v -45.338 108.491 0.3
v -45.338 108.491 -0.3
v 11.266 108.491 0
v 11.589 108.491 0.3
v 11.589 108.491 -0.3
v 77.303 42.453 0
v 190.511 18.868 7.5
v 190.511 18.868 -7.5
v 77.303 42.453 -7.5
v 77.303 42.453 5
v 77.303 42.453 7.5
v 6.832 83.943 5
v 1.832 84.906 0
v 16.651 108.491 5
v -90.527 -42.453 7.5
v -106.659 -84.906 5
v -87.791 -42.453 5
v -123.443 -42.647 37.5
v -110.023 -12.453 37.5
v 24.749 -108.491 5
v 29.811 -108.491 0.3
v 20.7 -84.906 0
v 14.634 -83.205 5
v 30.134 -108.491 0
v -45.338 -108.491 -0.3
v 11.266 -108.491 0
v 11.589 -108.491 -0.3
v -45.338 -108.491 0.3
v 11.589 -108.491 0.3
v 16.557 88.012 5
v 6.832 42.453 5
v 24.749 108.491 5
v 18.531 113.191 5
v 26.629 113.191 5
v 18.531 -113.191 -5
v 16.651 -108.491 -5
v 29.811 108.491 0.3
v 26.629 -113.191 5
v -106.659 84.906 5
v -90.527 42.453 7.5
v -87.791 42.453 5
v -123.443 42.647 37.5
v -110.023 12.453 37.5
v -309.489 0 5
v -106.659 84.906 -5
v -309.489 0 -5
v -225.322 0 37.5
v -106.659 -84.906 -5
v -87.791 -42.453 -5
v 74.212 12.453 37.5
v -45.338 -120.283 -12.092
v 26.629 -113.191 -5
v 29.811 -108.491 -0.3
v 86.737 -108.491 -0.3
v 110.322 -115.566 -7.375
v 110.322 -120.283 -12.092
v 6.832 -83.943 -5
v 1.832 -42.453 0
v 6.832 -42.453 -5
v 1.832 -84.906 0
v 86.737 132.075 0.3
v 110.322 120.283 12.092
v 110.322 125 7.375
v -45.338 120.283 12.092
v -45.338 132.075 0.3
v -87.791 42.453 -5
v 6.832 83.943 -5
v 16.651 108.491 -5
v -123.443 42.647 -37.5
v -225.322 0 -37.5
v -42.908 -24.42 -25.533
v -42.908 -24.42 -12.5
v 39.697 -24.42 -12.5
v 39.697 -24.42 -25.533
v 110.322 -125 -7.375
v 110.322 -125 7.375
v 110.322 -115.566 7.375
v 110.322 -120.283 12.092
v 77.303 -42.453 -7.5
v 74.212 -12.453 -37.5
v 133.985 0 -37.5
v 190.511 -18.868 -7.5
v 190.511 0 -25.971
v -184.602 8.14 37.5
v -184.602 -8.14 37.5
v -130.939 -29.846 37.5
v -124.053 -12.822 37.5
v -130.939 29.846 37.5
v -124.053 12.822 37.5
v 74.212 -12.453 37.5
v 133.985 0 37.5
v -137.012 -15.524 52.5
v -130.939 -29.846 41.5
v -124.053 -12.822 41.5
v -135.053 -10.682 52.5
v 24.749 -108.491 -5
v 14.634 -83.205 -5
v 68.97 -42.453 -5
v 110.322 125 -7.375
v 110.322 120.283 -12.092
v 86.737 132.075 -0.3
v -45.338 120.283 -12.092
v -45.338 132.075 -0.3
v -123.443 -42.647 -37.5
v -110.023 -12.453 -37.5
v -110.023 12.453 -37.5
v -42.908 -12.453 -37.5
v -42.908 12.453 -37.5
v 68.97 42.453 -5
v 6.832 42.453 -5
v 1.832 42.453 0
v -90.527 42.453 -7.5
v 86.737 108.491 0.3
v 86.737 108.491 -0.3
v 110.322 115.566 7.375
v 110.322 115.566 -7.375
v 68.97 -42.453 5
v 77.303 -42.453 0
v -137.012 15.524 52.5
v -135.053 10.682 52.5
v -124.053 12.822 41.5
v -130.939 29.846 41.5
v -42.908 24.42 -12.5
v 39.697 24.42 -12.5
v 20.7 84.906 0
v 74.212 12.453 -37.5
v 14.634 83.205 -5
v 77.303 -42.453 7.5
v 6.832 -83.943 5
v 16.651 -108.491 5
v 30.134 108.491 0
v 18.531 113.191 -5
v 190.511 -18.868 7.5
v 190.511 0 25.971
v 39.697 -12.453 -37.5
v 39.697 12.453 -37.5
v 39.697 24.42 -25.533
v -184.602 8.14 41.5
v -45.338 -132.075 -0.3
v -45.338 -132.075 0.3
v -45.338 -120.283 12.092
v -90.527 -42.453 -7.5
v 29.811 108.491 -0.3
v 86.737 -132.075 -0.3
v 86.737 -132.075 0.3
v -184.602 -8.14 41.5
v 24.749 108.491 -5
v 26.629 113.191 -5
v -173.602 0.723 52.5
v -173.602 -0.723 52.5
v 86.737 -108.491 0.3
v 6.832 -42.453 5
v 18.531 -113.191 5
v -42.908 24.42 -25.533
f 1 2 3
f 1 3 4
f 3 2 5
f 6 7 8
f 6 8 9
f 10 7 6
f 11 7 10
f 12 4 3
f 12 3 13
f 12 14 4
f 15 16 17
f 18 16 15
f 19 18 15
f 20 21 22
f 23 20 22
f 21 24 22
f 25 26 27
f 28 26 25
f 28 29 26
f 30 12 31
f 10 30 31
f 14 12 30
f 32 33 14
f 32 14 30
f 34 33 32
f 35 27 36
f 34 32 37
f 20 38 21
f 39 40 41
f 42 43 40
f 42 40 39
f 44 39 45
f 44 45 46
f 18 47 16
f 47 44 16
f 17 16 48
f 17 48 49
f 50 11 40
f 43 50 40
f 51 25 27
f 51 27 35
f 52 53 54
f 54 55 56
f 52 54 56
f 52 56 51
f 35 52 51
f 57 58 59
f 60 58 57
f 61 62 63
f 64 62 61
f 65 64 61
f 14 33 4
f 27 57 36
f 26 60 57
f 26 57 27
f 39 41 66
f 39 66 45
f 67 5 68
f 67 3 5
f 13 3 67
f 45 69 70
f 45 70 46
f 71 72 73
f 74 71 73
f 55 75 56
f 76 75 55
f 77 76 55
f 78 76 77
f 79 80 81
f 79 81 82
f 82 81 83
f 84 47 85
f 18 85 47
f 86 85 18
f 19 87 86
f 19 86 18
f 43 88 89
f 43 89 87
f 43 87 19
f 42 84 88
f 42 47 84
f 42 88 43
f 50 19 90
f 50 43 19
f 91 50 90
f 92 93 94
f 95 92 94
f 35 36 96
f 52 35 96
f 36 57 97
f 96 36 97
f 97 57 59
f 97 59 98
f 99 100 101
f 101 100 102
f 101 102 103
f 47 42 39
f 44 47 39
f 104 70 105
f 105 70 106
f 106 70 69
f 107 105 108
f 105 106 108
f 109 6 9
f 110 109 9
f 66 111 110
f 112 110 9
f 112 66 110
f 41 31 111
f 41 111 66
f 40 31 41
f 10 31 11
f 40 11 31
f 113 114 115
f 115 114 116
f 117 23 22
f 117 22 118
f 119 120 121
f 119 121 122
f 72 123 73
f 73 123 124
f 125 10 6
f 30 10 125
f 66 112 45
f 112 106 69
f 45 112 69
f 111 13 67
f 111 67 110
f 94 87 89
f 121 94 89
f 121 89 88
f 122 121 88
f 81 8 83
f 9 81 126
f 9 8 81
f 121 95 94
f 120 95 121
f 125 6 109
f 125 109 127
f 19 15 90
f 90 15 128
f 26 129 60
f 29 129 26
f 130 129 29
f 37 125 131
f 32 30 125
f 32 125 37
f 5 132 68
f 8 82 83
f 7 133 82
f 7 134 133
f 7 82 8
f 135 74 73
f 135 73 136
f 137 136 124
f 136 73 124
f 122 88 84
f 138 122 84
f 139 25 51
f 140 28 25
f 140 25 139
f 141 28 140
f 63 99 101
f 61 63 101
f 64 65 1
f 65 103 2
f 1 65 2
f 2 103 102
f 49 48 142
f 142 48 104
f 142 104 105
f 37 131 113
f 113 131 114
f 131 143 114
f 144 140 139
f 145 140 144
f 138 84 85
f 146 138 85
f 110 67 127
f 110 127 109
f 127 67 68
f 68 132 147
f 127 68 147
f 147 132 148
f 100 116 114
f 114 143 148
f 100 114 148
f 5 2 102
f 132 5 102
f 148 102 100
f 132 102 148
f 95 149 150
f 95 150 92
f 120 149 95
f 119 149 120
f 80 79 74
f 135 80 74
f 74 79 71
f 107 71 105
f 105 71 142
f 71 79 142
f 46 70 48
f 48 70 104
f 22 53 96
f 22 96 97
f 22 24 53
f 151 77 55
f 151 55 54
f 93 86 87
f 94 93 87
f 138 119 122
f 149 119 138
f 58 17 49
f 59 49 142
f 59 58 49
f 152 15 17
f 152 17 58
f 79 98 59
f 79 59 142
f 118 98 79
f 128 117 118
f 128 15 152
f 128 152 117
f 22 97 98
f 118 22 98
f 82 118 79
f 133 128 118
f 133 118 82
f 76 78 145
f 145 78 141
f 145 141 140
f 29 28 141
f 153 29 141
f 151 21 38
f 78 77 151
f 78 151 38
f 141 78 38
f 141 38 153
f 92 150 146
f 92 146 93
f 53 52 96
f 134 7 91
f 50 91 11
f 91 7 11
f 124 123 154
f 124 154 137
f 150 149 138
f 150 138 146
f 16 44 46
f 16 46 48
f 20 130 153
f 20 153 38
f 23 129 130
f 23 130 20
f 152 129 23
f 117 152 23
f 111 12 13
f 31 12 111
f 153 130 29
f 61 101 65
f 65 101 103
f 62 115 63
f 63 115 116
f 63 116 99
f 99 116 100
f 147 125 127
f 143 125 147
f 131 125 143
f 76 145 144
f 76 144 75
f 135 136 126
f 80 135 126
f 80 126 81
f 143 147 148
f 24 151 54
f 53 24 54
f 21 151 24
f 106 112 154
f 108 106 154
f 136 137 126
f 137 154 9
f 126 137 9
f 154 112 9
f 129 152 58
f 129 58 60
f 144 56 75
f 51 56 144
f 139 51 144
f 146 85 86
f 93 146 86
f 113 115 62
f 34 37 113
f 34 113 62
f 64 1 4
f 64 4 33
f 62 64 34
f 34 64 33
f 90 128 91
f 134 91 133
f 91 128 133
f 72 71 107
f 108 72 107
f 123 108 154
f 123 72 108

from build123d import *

# Parameters (mm, degrees)
F1_DEPTH      = 37.5
F2_SIZE       = 32.5
F3_DEPTH      = 5
F4_DEPTH      = 12.5
F5_SIZE       = 30
F6_SIZE       = 4.99999
F7_T1_DEPTH   = 216.7867093217
F7_T6_DEPTH   = 216.7867093217
F7_T12_DEPTH  = 216.7867093217
F7_T19_DEPTH  = 216.7867093217
F7_T25_DEPTH  = 216.7867093217
F7_T32_DEPTH  = 216.7867093217
F7_T38_DEPTH  = 216.7867093217
F7_T45_DEPTH  = 216.7867093217
F7_T51_DEPTH  = 216.7867093217
F7_T58_DEPTH  = 216.7867093217
F7_T64_DEPTH  = 216.7867093217
F7_T71_DEPTH  = 216.7867093217
F7_T77_DEPTH  = 216.7867093217
F7_T84_DEPTH  = 216.7867093217
F7_T90_DEPTH  = 216.7867093217
F7_T97_DEPTH  = 216.7867093217
F7_T103_DEPTH = 216.7867093217
F7_T110_DEPTH = 216.7867093217
F7_T116_DEPTH = 216.7867093217
F7_T123_DEPTH = 216.7867093217
F7_T129_DEPTH = 216.7867093217
F7_T136_DEPTH = 216.7867093217
F7_T142_DEPTH = 216.7867093217
F7_T149_DEPTH = 216.7867093217
F7_T155_DEPTH = 216.7867093217
F10_DEPTH     = 15
F11_SIZE      = 11
F13_W         = 82.6045945287
F13_H         = 48.8392151892
F14_DEPTH     = 25


# Not quite as in the source:
# - a fillet or chamfer that OpenCascade refuses, or shapes differently, is made with other operations: its cross-section is extruded or revolved along the edge and cut away or added
# - a fillet or chamfer is up to 0.001 mm smaller than in the source, because OpenCascade refuses the exact size
# - a feature names something its author has since deleted; it is built from what else it names


with BuildPart() as f1:
    # F0 (on Top) → F1 (new body, symmetric)
    with BuildSketch(Plane.XY):
        Polygon((-106.6587882222, 84.9056603774), (-309.4889769014, 0), (-106.6587882222, -84.9056603774), (-87.7908636939, -42.4528301887), (1.8317778155, -42.4528301887), (77.3034759288, -42.4528301887), (190.5110230986, -18.8679245283), (190.5110230986, 18.8679245283), (77.3034759288, 42.4528301887), (1.8317778155, 42.4528301887), (-87.7908636939, 42.4528301887), align=None)
    extrude(amount=F1_DEPTH, both=True)

    # F2
    f2_edges = [f1.edges().sort_by_distance(p)[0] for p in [
        (-208.073883, 42.45283, -37.5),
        (-208.073883, 42.45283, 37.5),
        (-208.073883, -42.45283, 37.5),
        (-208.073883, -42.45283, -37.5),
        (-97.224826, -63.679245, 37.5),
        (-97.224826, -63.679245, -37.5),
        (-97.224826, 63.679245, 37.5),
        (-97.224826, 63.679245, -37.5),
    ]]
    chamfer(f2_edges, length=F2_SIZE)

    # F0 (on Top) → F3 (join, symmetric)
    with BuildSketch(Plane.XY):
        Polygon((77.3034759288, -42.4528301887), (1.8317778155, -42.4528301887), (1.8317778155, -84.9056603774), (11.2657400797, -108.4905660377), (30.133664608, -108.4905660377), (20.6997023439, -84.9056603774), align=None)
        Polygon((1.8317778155, 84.9056603774), (1.8317778155, 42.4528301887), (77.3034759288, 42.4528301887), (20.6997023439, 84.9056603774), (30.133664608, 108.4905660377), (11.2657400797, 108.4905660377), align=None)
    extrude(amount=F3_DEPTH, both=True)

    # F0 (on Top) → F4 (join, symmetric)
    with BuildSketch(Plane.XY):
        Polygon((-45.3380335052, 108.4905660377), (11.2657400797, 108.4905660377), (30.133664608, 108.4905660377), (86.7374381929, 108.4905660377), (110.3223438533, 115.5660377358), (110.3223438533, 125), (86.7374381929, 132.0754716981), (-45.3380335052, 132.0754716981), align=None)
        Polygon((30.133664608, -108.4905660377), (11.2657400797, -108.4905660377), (-45.3380335052, -108.4905660377), (-45.3380335052, -132.0754716981), (86.7374381929, -132.0754716981), (110.3223438533, -125), (110.3223438533, -115.5660377358), (86.7374381929, -108.4905660377), align=None)
    extrude(amount=F4_DEPTH, both=True)

    # F5 (call 1 of 4: OpenCascade refuses the feature's edges together)
    f5_edges = [f1.edges().sort_by_distance(p)[0] for p in [
        (133.90725, 30.660377, -37.5),
        (-23.026354, 42.45283, -37.5),
    ]]
    chamfer(f5_edges, length=F5_SIZE)

    # F5#2 (call 2 of 4)
    f5_2_edges = [f1.edges().sort_by_distance(p)[0] for p in [
        (133.90725, 30.660377, 37.5),
        (-23.026354, 42.45283, 37.5),
    ]]
    chamfer(f5_2_edges, length=F5_SIZE)

    # F5#3 (call 3 of 4)
    f5_3_edges = [f1.edges().sort_by_distance(p)[0] for p in [
        (133.90725, -30.660377, 37.5),
        (-23.026354, -42.45283, 37.5),
    ]]
    chamfer(f5_3_edges, length=F5_SIZE)

    # F5#4 (call 4 of 4)
    f5_4_edges = [f1.edges().sort_by_distance(p)[0] for p in [
        (133.90725, -30.660377, -37.5),
        (-23.026354, -42.45283, -37.5),
    ]]
    chamfer(f5_4_edges, length=F5_SIZE)

    # F6 (size 5 in the source; OpenCascade refuses exactly that, so slightly less here)
    f6_edges = [f1.edges().sort_by_distance(p)[0] for p in [
        (1.831778, 63.679245, 5),
        (1.831778, 63.679245, -5),
        (49.001589, 63.679245, -5),
        (6.548759, 96.698113, 5),
        (6.548759, 96.698113, -5),
        (25.416683, 96.698113, -5),
        (25.416683, 96.698113, 5),
        (49.001589, -63.679245, -5),
        (1.831778, -63.679245, -5),
        (6.548759, -96.698113, -5),
        (25.416683, -96.698113, -5),
        (1.831778, -63.679245, 5),
        (6.548759, -96.698113, 5),
        (49.001589, -63.679245, 5),
        (25.416683, -96.698113, 5),
    ]]
    chamfer(f6_edges, length=F6_SIZE)

    # F7: chamfer of 12.2 on 8 edges, made by hand

    # F7_s2 → F7_t1 (cut)
    with BuildSketch(Plane.YZ.offset(-76.7125659584)):
        Polygon((-119.8754716981, 12.5), (-132.0754716981, 0.3), (-132.0754716981, 12.5), align=None)
        Polygon((-119.8754716981, -12.5), (-132.0754716981, -0.3), (-132.0754716981, -12.5), align=None)
        Polygon((119.8754716981, -12.5), (132.0754716981, -0.3), (132.0754716981, -12.5), align=None)
        Polygon((119.8754716981, 12.5), (132.0754716981, 0.3), (132.0754716981, 12.5), align=None)
    extrude(amount=F7_T1_DEPTH, mode=Mode.SUBTRACT)


with BuildPart() as f7_tool4:
    # F7_s5 → F7_t6 (new body)
    with BuildSketch(Plane.YZ.offset(140.0741433633)):
        Polygon((-108.4905660377, 0.3), (-120.6905660377, 12.5), (-108.4905660377, 12.5), align=None)
    extrude(amount=-F7_T6_DEPTH)

    split(bisect_by=Plane.XY.offset(5), keep=Keep.BOTTOM)

    split(bisect_by=Plane(origin=(-5.7166168262, -2.2866467305, -6.1569847497), x_dir=(-0.3713906764, 0.9284766909, 0), z_dir=(0.6565321643, 0.2626128657, 0.7071067812)), keep=Keep.TOP)


with BuildPart() as f1_1:
    add(f1.part)

    # F7_t3: cut F7_tool4
    add(f7_tool4.part, mode=Mode.SUBTRACT)


with BuildPart() as f7_tool10:
    # F7_s11 → F7_t12 (new body)
    with BuildSketch(Plane.YZ.offset(140.0741433633)):
        Polygon((-108.4905660377, 0.3), (-120.6905660377, 12.5), (-108.4905660377, 12.5), align=None)
    extrude(amount=-F7_T12_DEPTH)

    split(bisect_by=Plane.XY.offset(5), keep=Keep.TOP)

    split(bisect_by=Plane(origin=(-5.7166168262, -2.2866467305, -6.1569847497), x_dir=(-0.3713906764, 0.9284766909, 0), z_dir=(0.6565321643, 0.2626128657, 0.7071067812)), keep=Keep.TOP)

    split(bisect_by=Plane(origin=(-13.8493522007, -5.5397408803, 14.9162088146), x_dir=(-0.3713906764, 0.9284766909, 0), z_dir=(0.6565321643, 0.2626128657, -0.7071067812)), keep=Keep.TOP)


with BuildPart() as f1_2:
    add(f1_1.part)

    # F7_t9: cut F7_tool10
    add(f7_tool10.part, mode=Mode.SUBTRACT)


with BuildPart() as f7_tool17:
    # F7_s18 → F7_t19 (new body)
    with BuildSketch(Plane.YZ.offset(140.0741433633)):
        Polygon((-108.4905660377, 0.3), (-120.6905660377, 12.5), (-108.4905660377, 12.5), align=None)
    extrude(amount=-F7_T19_DEPTH)

    split(bisect_by=Plane(origin=(-5.7166168262, -2.2866467305, -6.1569847497), x_dir=(-0.3713906764, 0.9284766909, 0), z_dir=(0.6565321643, 0.2626128657, 0.7071067812)), keep=Keep.TOP)

    split(bisect_by=Plane(origin=(-13.8493522007, -5.5397408803, 14.9162088146), x_dir=(0.3713906764, -0.9284766909, 0), z_dir=(-0.6565321643, -0.2626128657, 0.7071067812)), keep=Keep.TOP)


with BuildPart() as f1_3:
    add(f1_2.part)

    # F7_t16: cut F7_tool17
    add(f7_tool17.part, mode=Mode.SUBTRACT)


with BuildPart() as f7_tool23:
    # F7_s24 → F7_t25 (new body)
    with BuildSketch(Plane.YZ.offset(140.0741433633)):
        Polygon((-108.4905660377, 0.3), (-120.6905660377, 12.5), (-108.4905660377, 12.5), align=None)
    extrude(amount=-F7_T25_DEPTH)

    split(bisect_by=Plane.XY.offset(5), keep=Keep.TOP)

    split(bisect_by=Plane(origin=(-5.7166168262, -2.2866467305, -6.1569847497), x_dir=(0.3713906764, -0.9284766909, 0), z_dir=(-0.6565321643, -0.2626128657, -0.7071067812)), keep=Keep.TOP)

    split(bisect_by=Plane(origin=(-13.8493522007, -5.5397408803, 14.9162088146), x_dir=(-0.3713906764, 0.9284766909, 0), z_dir=(0.6565321643, 0.2626128657, -0.7071067812)), keep=Keep.TOP)


with BuildPart() as f1_4:
    add(f1_3.part)

    # F7_t22: cut F7_tool23
    add(f7_tool23.part, mode=Mode.SUBTRACT)


with BuildPart() as f7_tool30:
    # F7_s31 → F7_t32 (new body)
    with BuildSketch(Plane.YZ.offset(140.0741433633)):
        Polygon((-108.4905660377, 0.3), (-120.6905660377, 12.5), (-108.4905660377, 12.5), align=None)
    extrude(amount=-F7_T32_DEPTH)

    split(bisect_by=Plane.XY.offset(5), keep=Keep.BOTTOM)

    split(bisect_by=Plane(origin=(-13.8493522007, -5.5397408803, 14.9162088146), x_dir=(0.3713906764, -0.9284766909, 0), z_dir=(-0.6565321643, -0.2626128657, 0.7071067812)), keep=Keep.TOP)


with BuildPart() as f1_5:
    add(f1_4.part)

    # F7_t29: cut F7_tool30
    add(f7_tool30.part, mode=Mode.SUBTRACT)


with BuildPart() as f7_tool36:
    # F7_s37 → F7_t38 (new body)
    with BuildSketch(Plane.YZ.offset(140.0741433633)):
        Polygon((-108.4905660377, 0.3), (-120.6905660377, 12.5), (-108.4905660377, 12.5), align=None)
    extrude(amount=-F7_T38_DEPTH)

    split(bisect_by=Plane.XY.offset(5), keep=Keep.TOP)

    split(bisect_by=Plane(origin=(-5.7166168262, -2.2866467305, -6.1569847497), x_dir=(0.3713906764, -0.9284766909, 0), z_dir=(-0.6565321643, -0.2626128657, -0.7071067812)), keep=Keep.TOP)

    split(bisect_by=Plane(origin=(-13.8493522007, -5.5397408803, 14.9162088146), x_dir=(0.3713906764, -0.9284766909, 0), z_dir=(-0.6565321643, -0.2626128657, 0.7071067812)), keep=Keep.TOP)


with BuildPart() as f1_6:
    add(f1_5.part)

    # F7_t35: cut F7_tool36
    add(f7_tool36.part, mode=Mode.SUBTRACT)


with BuildPart() as f7_tool43:
    # F7_s44 → F7_t45 (new body)
    with BuildSketch(Plane.YZ.offset(140.0741433633)):
        Polygon((-108.4905660377, -0.3), (-120.6905660377, -12.5), (-108.4905660377, -12.5), align=None)
    extrude(amount=-F7_T45_DEPTH)

    split(bisect_by=Plane.XY.offset(-5), keep=Keep.TOP)

    split(bisect_by=Plane(origin=(-5.7166168262, -2.2866467305, 6.1569847497), x_dir=(-0.3713906764, 0.9284766909, 0), z_dir=(0.6565321643, 0.2626128657, -0.7071067812)), keep=Keep.TOP)


with BuildPart() as f1_7:
    add(f1_6.part)

    # F7_t42: cut F7_tool43
    add(f7_tool43.part, mode=Mode.SUBTRACT)


with BuildPart() as f7_tool49:
    # F7_s50 → F7_t51 (new body)
    with BuildSketch(Plane.YZ.offset(140.0741433633)):
        Polygon((-108.4905660377, -0.3), (-120.6905660377, -12.5), (-108.4905660377, -12.5), align=None)
    extrude(amount=-F7_T51_DEPTH)

    split(bisect_by=Plane.XY.offset(-5), keep=Keep.BOTTOM)

    split(bisect_by=Plane(origin=(-5.7166168262, -2.2866467305, 6.1569847497), x_dir=(-0.3713906764, 0.9284766909, 0), z_dir=(0.6565321643, 0.2626128657, -0.7071067812)), keep=Keep.TOP)

    split(bisect_by=Plane(origin=(-13.8493522007, -5.5397408803, -14.9162088146), x_dir=(-0.3713906764, 0.9284766909, 0), z_dir=(0.6565321643, 0.2626128657, 0.7071067812)), keep=Keep.TOP)


with BuildPart() as f1_8:
    add(f1_7.part)

    # F7_t48: cut F7_tool49
    add(f7_tool49.part, mode=Mode.SUBTRACT)


with BuildPart() as f7_tool56:
    # F7_s57 → F7_t58 (new body)
    with BuildSketch(Plane.YZ.offset(140.0741433633)):
        Polygon((-108.4905660377, -0.3), (-120.6905660377, -12.5), (-108.4905660377, -12.5), align=None)
    extrude(amount=-F7_T58_DEPTH)

    split(bisect_by=Plane(origin=(-5.7166168262, -2.2866467305, 6.1569847497), x_dir=(-0.3713906764, 0.9284766909, 0), z_dir=(0.6565321643, 0.2626128657, -0.7071067812)), keep=Keep.TOP)

    split(bisect_by=Plane(origin=(-13.8493522007, -5.5397408803, -14.9162088146), x_dir=(0.3713906764, -0.9284766909, 0), z_dir=(-0.6565321643, -0.2626128657, -0.7071067812)), keep=Keep.TOP)


with BuildPart() as f1_9:
    add(f1_8.part)

    # F7_t55: cut F7_tool56
    add(f7_tool56.part, mode=Mode.SUBTRACT)


with BuildPart() as f7_tool62:
    # F7_s63 → F7_t64 (new body)
    with BuildSketch(Plane.YZ.offset(140.0741433633)):
        Polygon((-108.4905660377, -0.3), (-120.6905660377, -12.5), (-108.4905660377, -12.5), align=None)
    extrude(amount=-F7_T64_DEPTH)

    split(bisect_by=Plane.XY.offset(-5), keep=Keep.BOTTOM)

    split(bisect_by=Plane(origin=(-5.7166168262, -2.2866467305, 6.1569847497), x_dir=(0.3713906764, -0.9284766909, 0), z_dir=(-0.6565321643, -0.2626128657, 0.7071067812)), keep=Keep.TOP)

    split(bisect_by=Plane(origin=(-13.8493522007, -5.5397408803, -14.9162088146), x_dir=(-0.3713906764, 0.9284766909, 0), z_dir=(0.6565321643, 0.2626128657, 0.7071067812)), keep=Keep.TOP)


with BuildPart() as f1_10:
    add(f1_9.part)

    # F7_t61: cut F7_tool62
    add(f7_tool62.part, mode=Mode.SUBTRACT)


with BuildPart() as f7_tool69:
    # F7_s70 → F7_t71 (new body)
    with BuildSketch(Plane.YZ.offset(140.0741433633)):
        Polygon((-108.4905660377, -0.3), (-120.6905660377, -12.5), (-108.4905660377, -12.5), align=None)
    extrude(amount=-F7_T71_DEPTH)

    split(bisect_by=Plane.XY.offset(-5), keep=Keep.TOP)

    split(bisect_by=Plane(origin=(-13.8493522007, -5.5397408803, -14.9162088146), x_dir=(0.3713906764, -0.9284766909, 0), z_dir=(-0.6565321643, -0.2626128657, -0.7071067812)), keep=Keep.TOP)


with BuildPart() as f1_11:
    add(f1_10.part)

    # F7_t68: cut F7_tool69
    add(f7_tool69.part, mode=Mode.SUBTRACT)


with BuildPart() as f7_tool75:
    # F7_s76 → F7_t77 (new body)
    with BuildSketch(Plane.YZ.offset(140.0741433633)):
        Polygon((-108.4905660377, -0.3), (-120.6905660377, -12.5), (-108.4905660377, -12.5), align=None)
    extrude(amount=-F7_T77_DEPTH)

    split(bisect_by=Plane.XY.offset(-5), keep=Keep.BOTTOM)

    split(bisect_by=Plane(origin=(-5.7166168262, -2.2866467305, 6.1569847497), x_dir=(0.3713906764, -0.9284766909, 0), z_dir=(-0.6565321643, -0.2626128657, 0.7071067812)), keep=Keep.TOP)

    split(bisect_by=Plane(origin=(-13.8493522007, -5.5397408803, -14.9162088146), x_dir=(0.3713906764, -0.9284766909, 0), z_dir=(-0.6565321643, -0.2626128657, -0.7071067812)), keep=Keep.TOP)


with BuildPart() as f1_12:
    add(f1_11.part)

    # F7_t74: cut F7_tool75
    add(f7_tool75.part, mode=Mode.SUBTRACT)


with BuildPart() as f7_tool82:
    # F7_s83 → F7_t84 (new body)
    with BuildSketch(Plane.YZ.offset(-76.7125659584)):
        Polygon((108.4905660377, 0.3), (120.6905660377, 12.5), (108.4905660377, 12.5), align=None)
    extrude(amount=F7_T84_DEPTH)

    split(bisect_by=Plane.XY.offset(5), keep=Keep.BOTTOM)

    split(bisect_by=Plane(origin=(-13.8493522007, 5.5397408803, 14.9162088146), x_dir=(-0.3713906764, -0.9284766909, 0), z_dir=(-0.6565321643, 0.2626128657, 0.7071067812)), keep=Keep.TOP)


with BuildPart() as f1_13:
    add(f1_12.part)

    # F7_t81: cut F7_tool82
    add(f7_tool82.part, mode=Mode.SUBTRACT)


with BuildPart() as f7_tool88:
    # F7_s89 → F7_t90 (new body)
    with BuildSketch(Plane.YZ.offset(-76.7125659584)):
        Polygon((108.4905660377, 0.3), (120.6905660377, 12.5), (108.4905660377, 12.5), align=None)
    extrude(amount=F7_T90_DEPTH)

    split(bisect_by=Plane.XY.offset(5), keep=Keep.TOP)

    split(bisect_by=Plane(origin=(-5.7166168262, 2.2866467305, -6.1569847497), x_dir=(-0.3713906764, -0.9284766909, 0), z_dir=(-0.6565321643, 0.2626128657, -0.7071067812)), keep=Keep.TOP)

    split(bisect_by=Plane(origin=(-13.8493522007, 5.5397408803, 14.9162088146), x_dir=(-0.3713906764, -0.9284766909, 0), z_dir=(-0.6565321643, 0.2626128657, 0.7071067812)), keep=Keep.TOP)


with BuildPart() as f1_14:
    add(f1_13.part)

    # F7_t87: cut F7_tool88
    add(f7_tool88.part, mode=Mode.SUBTRACT)


with BuildPart() as f7_tool95:
    # F7_s96 → F7_t97 (new body)
    with BuildSketch(Plane.YZ.offset(-76.7125659584)):
        Polygon((108.4905660377, 0.3), (120.6905660377, 12.5), (108.4905660377, 12.5), align=None)
    extrude(amount=F7_T97_DEPTH)

    split(bisect_by=Plane(origin=(-5.7166168262, 2.2866467305, -6.1569847497), x_dir=(0.3713906764, 0.9284766909, 0), z_dir=(0.6565321643, -0.2626128657, 0.7071067812)), keep=Keep.TOP)

    split(bisect_by=Plane(origin=(-13.8493522007, 5.5397408803, 14.9162088146), x_dir=(-0.3713906764, -0.9284766909, 0), z_dir=(-0.6565321643, 0.2626128657, 0.7071067812)), keep=Keep.TOP)


with BuildPart() as f1_15:
    add(f1_14.part)

    # F7_t94: cut F7_tool95
    add(f7_tool95.part, mode=Mode.SUBTRACT)


with BuildPart() as f7_tool101:
    # F7_s102 → F7_t103 (new body)
    with BuildSketch(Plane.YZ.offset(-76.7125659584)):
        Polygon((108.4905660377, 0.3), (120.6905660377, 12.5), (108.4905660377, 12.5), align=None)
    extrude(amount=F7_T103_DEPTH)

    split(bisect_by=Plane.XY.offset(5), keep=Keep.TOP)

    split(bisect_by=Plane(origin=(-5.7166168262, 2.2866467305, -6.1569847497), x_dir=(-0.3713906764, -0.9284766909, 0), z_dir=(-0.6565321643, 0.2626128657, -0.7071067812)), keep=Keep.TOP)

    split(bisect_by=Plane(origin=(-13.8493522007, 5.5397408803, 14.9162088146), x_dir=(0.3713906764, 0.9284766909, 0), z_dir=(0.6565321643, -0.2626128657, -0.7071067812)), keep=Keep.TOP)


with BuildPart() as f1_16:
    add(f1_15.part)

    # F7_t100: cut F7_tool101
    add(f7_tool101.part, mode=Mode.SUBTRACT)


with BuildPart() as f7_tool108:
    # F7_s109 → F7_t110 (new body)
    with BuildSketch(Plane.YZ.offset(-76.7125659584)):
        Polygon((108.4905660377, 0.3), (120.6905660377, 12.5), (108.4905660377, 12.5), align=None)
    extrude(amount=F7_T110_DEPTH)

    split(bisect_by=Plane.XY.offset(5), keep=Keep.BOTTOM)

    split(bisect_by=Plane(origin=(-5.7166168262, 2.2866467305, -6.1569847497), x_dir=(0.3713906764, 0.9284766909, 0), z_dir=(0.6565321643, -0.2626128657, 0.7071067812)), keep=Keep.TOP)


with BuildPart() as f1_17:
    add(f1_16.part)

    # F7_t107: cut F7_tool108
    add(f7_tool108.part, mode=Mode.SUBTRACT)


with BuildPart() as f7_tool114:
    # F7_s115 → F7_t116 (new body)
    with BuildSketch(Plane.YZ.offset(-76.7125659584)):
        Polygon((108.4905660377, 0.3), (120.6905660377, 12.5), (108.4905660377, 12.5), align=None)
    extrude(amount=F7_T116_DEPTH)

    split(bisect_by=Plane.XY.offset(5), keep=Keep.TOP)

    split(bisect_by=Plane(origin=(-5.7166168262, 2.2866467305, -6.1569847497), x_dir=(0.3713906764, 0.9284766909, 0), z_dir=(0.6565321643, -0.2626128657, 0.7071067812)), keep=Keep.TOP)

    split(bisect_by=Plane(origin=(-13.8493522007, 5.5397408803, 14.9162088146), x_dir=(0.3713906764, 0.9284766909, 0), z_dir=(0.6565321643, -0.2626128657, -0.7071067812)), keep=Keep.TOP)


with BuildPart() as f1_18:
    add(f1_17.part)

    # F7_t113: cut F7_tool114
    add(f7_tool114.part, mode=Mode.SUBTRACT)


with BuildPart() as f7_tool121:
    # F7_s122 → F7_t123 (new body)
    with BuildSketch(Plane.YZ.offset(-76.7125659584)):
        Polygon((108.4905660377, -0.3), (120.6905660377, -12.5), (108.4905660377, -12.5), align=None)
    extrude(amount=F7_T123_DEPTH)

    split(bisect_by=Plane.XY.offset(-5), keep=Keep.TOP)

    split(bisect_by=Plane(origin=(-13.8493522007, 5.5397408803, -14.9162088146), x_dir=(-0.3713906764, -0.9284766909, 0), z_dir=(-0.6565321643, 0.2626128657, -0.7071067812)), keep=Keep.TOP)


with BuildPart() as f1_19:
    add(f1_18.part)

    # F7_t120: cut F7_tool121
    add(f7_tool121.part, mode=Mode.SUBTRACT)


with BuildPart() as f7_tool127:
    # F7_s128 → F7_t129 (new body)
    with BuildSketch(Plane.YZ.offset(-76.7125659584)):
        Polygon((108.4905660377, -0.3), (120.6905660377, -12.5), (108.4905660377, -12.5), align=None)
    extrude(amount=F7_T129_DEPTH)

    split(bisect_by=Plane.XY.offset(-5), keep=Keep.BOTTOM)

    split(bisect_by=Plane(origin=(-5.7166168262, 2.2866467305, 6.1569847497), x_dir=(-0.3713906764, -0.9284766909, 0), z_dir=(-0.6565321643, 0.2626128657, 0.7071067812)), keep=Keep.TOP)

    split(bisect_by=Plane(origin=(-13.8493522007, 5.5397408803, -14.9162088146), x_dir=(-0.3713906764, -0.9284766909, 0), z_dir=(-0.6565321643, 0.2626128657, -0.7071067812)), keep=Keep.TOP)


with BuildPart() as f1_20:
    add(f1_19.part)

    # F7_t126: cut F7_tool127
    add(f7_tool127.part, mode=Mode.SUBTRACT)


with BuildPart() as f7_tool134:
    # F7_s135 → F7_t136 (new body)
    with BuildSketch(Plane.YZ.offset(-76.7125659584)):
        Polygon((108.4905660377, -0.3), (120.6905660377, -12.5), (108.4905660377, -12.5), align=None)
    extrude(amount=F7_T136_DEPTH)

    split(bisect_by=Plane(origin=(-5.7166168262, 2.2866467305, 6.1569847497), x_dir=(0.3713906764, 0.9284766909, 0), z_dir=(0.6565321643, -0.2626128657, -0.7071067812)), keep=Keep.TOP)

    split(bisect_by=Plane(origin=(-13.8493522007, 5.5397408803, -14.9162088146), x_dir=(-0.3713906764, -0.9284766909, 0), z_dir=(-0.6565321643, 0.2626128657, -0.7071067812)), keep=Keep.TOP)


with BuildPart() as f1_21:
    add(f1_20.part)

    # F7_t133: cut F7_tool134
    add(f7_tool134.part, mode=Mode.SUBTRACT)


with BuildPart() as f7_tool140:
    # F7_s141 → F7_t142 (new body)
    with BuildSketch(Plane.YZ.offset(-76.7125659584)):
        Polygon((108.4905660377, -0.3), (120.6905660377, -12.5), (108.4905660377, -12.5), align=None)
    extrude(amount=F7_T142_DEPTH)

    split(bisect_by=Plane.XY.offset(-5), keep=Keep.BOTTOM)

    split(bisect_by=Plane(origin=(-5.7166168262, 2.2866467305, 6.1569847497), x_dir=(-0.3713906764, -0.9284766909, 0), z_dir=(-0.6565321643, 0.2626128657, 0.7071067812)), keep=Keep.TOP)

    split(bisect_by=Plane(origin=(-13.8493522007, 5.5397408803, -14.9162088146), x_dir=(0.3713906764, 0.9284766909, 0), z_dir=(0.6565321643, -0.2626128657, 0.7071067812)), keep=Keep.TOP)


with BuildPart() as f1_22:
    add(f1_21.part)

    # F7_t139: cut F7_tool140
    add(f7_tool140.part, mode=Mode.SUBTRACT)


with BuildPart() as f7_tool147:
    # F7_s148 → F7_t149 (new body)
    with BuildSketch(Plane.YZ.offset(-76.7125659584)):
        Polygon((108.4905660377, -0.3), (120.6905660377, -12.5), (108.4905660377, -12.5), align=None)
    extrude(amount=F7_T149_DEPTH)

    split(bisect_by=Plane.XY.offset(-5), keep=Keep.TOP)

    split(bisect_by=Plane(origin=(-5.7166168262, 2.2866467305, 6.1569847497), x_dir=(0.3713906764, 0.9284766909, 0), z_dir=(0.6565321643, -0.2626128657, -0.7071067812)), keep=Keep.TOP)


with BuildPart() as f1_23:
    add(f1_22.part)

    # F7_t146: cut F7_tool147
    add(f7_tool147.part, mode=Mode.SUBTRACT)


with BuildPart() as f7_tool153:
    # F7_s154 → F7_t155 (new body)
    with BuildSketch(Plane.YZ.offset(-76.7125659584)):
        Polygon((108.4905660377, -0.3), (120.6905660377, -12.5), (108.4905660377, -12.5), align=None)
    extrude(amount=F7_T155_DEPTH)

    split(bisect_by=Plane.XY.offset(-5), keep=Keep.BOTTOM)

    split(bisect_by=Plane(origin=(-5.7166168262, 2.2866467305, 6.1569847497), x_dir=(0.3713906764, 0.9284766909, 0), z_dir=(0.6565321643, -0.2626128657, -0.7071067812)), keep=Keep.TOP)

    split(bisect_by=Plane(origin=(-13.8493522007, 5.5397408803, -14.9162088146), x_dir=(0.3713906764, 0.9284766909, 0), z_dir=(0.6565321643, -0.2626128657, 0.7071067812)), keep=Keep.TOP)


with BuildPart() as f1_24:
    add(f1_23.part)

    # F7_t152: cut F7_tool153
    add(f7_tool153.part, mode=Mode.SUBTRACT)

    # F9 (on offset) → F10 (join)
    with BuildSketch(Plane.XY.offset(37.5)):
        Polygon((-184.6017837524, 8.1398682669), (-184.6017837524, -8.1398682669), (-130.9389472008, -29.8461858183), (-124.052836571, -12.8221913831), (-124.052836571, 12.8221913831), (-130.9389472008, 29.8461858183), align=None)
    extrude(amount=F10_DEPTH)

    # F11
    f11_edges = [f1_24.edges().sort_by_distance(p)[0] for p in [
        (-157.770365, 18.993027, 52.5),
        (-184.601784, 0, 52.5),
        (-157.770365, -18.993027, 52.5),
        (-127.495892, -21.334189, 52.5),
        (-124.052837, 0, 52.5),
        (-127.495892, 21.334189, 52.5),
    ]]
    chamfer(f11_edges, length=F11_SIZE)

    # F13 (on offset) → F14 (cut)
    with BuildSketch(Plane.XY.offset(-12.5)):
        with Locations((-1.6054697335, 0)):
            Rectangle(F13_W, F13_H)
    extrude(amount=-F14_DEPTH, mode=Mode.SUBTRACT)


solid = f1_24.part
